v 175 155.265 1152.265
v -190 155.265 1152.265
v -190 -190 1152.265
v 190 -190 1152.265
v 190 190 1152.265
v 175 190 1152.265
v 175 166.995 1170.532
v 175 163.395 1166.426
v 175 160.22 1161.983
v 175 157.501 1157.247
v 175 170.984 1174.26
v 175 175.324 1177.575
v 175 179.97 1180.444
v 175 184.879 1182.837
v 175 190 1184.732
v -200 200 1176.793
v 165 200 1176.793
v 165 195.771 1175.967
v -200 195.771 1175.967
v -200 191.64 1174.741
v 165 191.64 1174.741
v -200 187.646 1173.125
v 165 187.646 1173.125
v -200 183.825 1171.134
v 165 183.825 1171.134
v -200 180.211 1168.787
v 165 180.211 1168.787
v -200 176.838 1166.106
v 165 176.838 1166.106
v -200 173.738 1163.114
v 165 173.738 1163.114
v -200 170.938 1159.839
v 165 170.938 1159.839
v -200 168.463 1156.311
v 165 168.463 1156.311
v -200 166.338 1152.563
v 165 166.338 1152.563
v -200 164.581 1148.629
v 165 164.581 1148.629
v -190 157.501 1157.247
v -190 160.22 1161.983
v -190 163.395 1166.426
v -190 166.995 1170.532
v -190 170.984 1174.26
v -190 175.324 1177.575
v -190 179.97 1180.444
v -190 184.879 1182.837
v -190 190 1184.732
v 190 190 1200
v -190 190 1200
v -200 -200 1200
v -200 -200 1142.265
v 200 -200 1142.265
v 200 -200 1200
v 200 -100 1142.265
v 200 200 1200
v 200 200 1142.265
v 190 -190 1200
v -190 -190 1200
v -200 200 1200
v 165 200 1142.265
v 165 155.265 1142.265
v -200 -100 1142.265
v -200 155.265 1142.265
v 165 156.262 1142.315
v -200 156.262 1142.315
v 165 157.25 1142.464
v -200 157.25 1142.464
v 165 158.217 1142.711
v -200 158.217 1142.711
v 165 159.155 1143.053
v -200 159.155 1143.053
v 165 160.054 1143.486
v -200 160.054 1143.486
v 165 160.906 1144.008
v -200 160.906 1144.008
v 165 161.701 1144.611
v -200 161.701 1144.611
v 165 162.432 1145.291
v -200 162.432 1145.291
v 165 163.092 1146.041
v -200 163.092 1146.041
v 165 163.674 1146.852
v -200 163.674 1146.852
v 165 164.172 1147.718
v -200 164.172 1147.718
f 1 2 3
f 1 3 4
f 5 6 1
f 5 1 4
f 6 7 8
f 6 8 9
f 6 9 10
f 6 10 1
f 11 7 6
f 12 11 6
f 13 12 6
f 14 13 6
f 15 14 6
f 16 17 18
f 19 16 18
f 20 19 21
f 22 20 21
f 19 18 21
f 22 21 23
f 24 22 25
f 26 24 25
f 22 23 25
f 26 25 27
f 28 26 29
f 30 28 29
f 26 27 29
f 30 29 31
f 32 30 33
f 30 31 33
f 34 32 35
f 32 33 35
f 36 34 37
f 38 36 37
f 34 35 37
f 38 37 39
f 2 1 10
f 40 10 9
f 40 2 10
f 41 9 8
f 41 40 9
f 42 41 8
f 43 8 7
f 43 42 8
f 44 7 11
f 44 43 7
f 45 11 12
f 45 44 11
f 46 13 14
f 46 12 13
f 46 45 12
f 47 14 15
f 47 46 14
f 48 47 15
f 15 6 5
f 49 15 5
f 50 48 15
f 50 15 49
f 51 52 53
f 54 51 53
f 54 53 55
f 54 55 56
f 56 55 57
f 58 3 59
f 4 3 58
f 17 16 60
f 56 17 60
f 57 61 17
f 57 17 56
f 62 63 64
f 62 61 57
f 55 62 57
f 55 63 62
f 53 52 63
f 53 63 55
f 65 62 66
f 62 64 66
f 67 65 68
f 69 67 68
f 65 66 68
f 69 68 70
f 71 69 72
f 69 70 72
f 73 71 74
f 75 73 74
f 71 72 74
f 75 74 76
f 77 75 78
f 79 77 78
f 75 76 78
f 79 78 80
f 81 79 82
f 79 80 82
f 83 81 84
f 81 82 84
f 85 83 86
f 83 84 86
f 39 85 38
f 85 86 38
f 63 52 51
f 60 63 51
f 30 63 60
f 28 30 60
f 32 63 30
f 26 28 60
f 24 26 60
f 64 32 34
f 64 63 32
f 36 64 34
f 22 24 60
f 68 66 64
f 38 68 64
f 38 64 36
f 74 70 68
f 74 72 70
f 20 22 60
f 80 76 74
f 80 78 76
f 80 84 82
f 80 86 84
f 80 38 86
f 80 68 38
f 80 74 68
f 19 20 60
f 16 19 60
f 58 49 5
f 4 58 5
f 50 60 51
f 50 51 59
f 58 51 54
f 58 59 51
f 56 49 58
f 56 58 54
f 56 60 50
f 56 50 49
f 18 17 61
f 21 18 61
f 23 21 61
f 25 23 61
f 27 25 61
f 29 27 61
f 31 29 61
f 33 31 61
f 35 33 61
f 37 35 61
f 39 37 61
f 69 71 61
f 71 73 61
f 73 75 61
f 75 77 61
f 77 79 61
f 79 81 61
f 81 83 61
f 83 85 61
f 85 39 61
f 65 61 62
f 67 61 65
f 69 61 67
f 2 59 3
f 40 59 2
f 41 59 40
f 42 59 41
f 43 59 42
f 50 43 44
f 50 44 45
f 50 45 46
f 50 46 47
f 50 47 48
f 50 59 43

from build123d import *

# Parameters (mm, degrees)
ESQUISSE1_W              = 400
ESQUISSE1_H              = 400
BOSS_EXTRU_1_DEPTH       = 1200
ESQUISSE4_W              = 400
ESQUISSE4_H              = 130.6
ENL_V_MAT_EXTRU_1_DEPTH  = 300
ENL_V_MAT_EXTRU_2_DEPTH  = 100
ESQUISSE13_W             = 400
ESQUISSE13_H             = 400
ENL_V_MAT_EXTRU_10_DEPTH = 400
ENL_V_START              = -35
ENL_V_MAT_EXTRU_11_DEPTH = 400
CONG_3_R                 = 10
ENL_V_MAT_EXTRU_12_DEPTH = 100
CONG_5_R                 = 5
COQUE1_START             = -90
COQUE1_OUTLINE_W         = 380
COQUE1_OUTLINE_H         = 591.664973081
COQUE1_DEPTH             = 280
COQUE1_START_2           = -190
COQUE1_2_DEPTH           = 345.26524617
COQUE1_3_OUTLINE_W       = 380
COQUE1_3_OUTLINE_H       = 150.6
COQUE1_3_DEPTH           = 80
COQUE1_4_DEPTH           = 380
COQUE1_START_3           = 175
COQUE1_5_DEPTH           = 15
ESQUISSE21_W             = 360
ESQUISSE21_H             = 260
ENL_V_MAT_EXTRU_13_DEPTH = 300
ENL_V_MAT_EXTRU_14_DEPTH = 674.894679675
ENL_V_MAT_EXTRU_15_DEPTH = 280
ESQUISSE24_W             = 400
ESQUISSE24_H             = 742.264973081
ENL_V_MAT_EXTRU_16_DEPTH = 1281.624847487
BOSS_EXTRU_2_REACH       = 1257.428
ESQUISSE25_W             = 380
ESQUISSE25_H             = 10


with BuildPart() as part:
    # Esquisse1 → Boss.-Extru.1 (new body)
    with BuildSketch(Plane.XY):
        Rectangle(ESQUISSE1_W, ESQUISSE1_H)
    extrude(amount=BOSS_EXTRU_1_DEPTH)

    # Esquisse4 → Enlèv. mat.-Extru.1 (cut)
    with BuildSketch(Plane(origin=(0, 200, 0), x_dir=(1, 0, 0), z_dir=(0, 1, 0))):
        with Locations((0, -1076.964973081)):
            Rectangle(ESQUISSE4_W, ESQUISSE4_H)
    extrude(amount=-ENL_V_MAT_EXTRU_1_DEPTH, mode=Mode.SUBTRACT)

    # Esquisse5 → Enlèv. mat.-Extru.2 (cut)
    with BuildSketch(Plane.XZ.offset(200)):
        with BuildLine():
            Line((-145, 902.264973081), (145, 902.264973081))
            ThreePointArc((145, 902.264973081), (155.606601718, 897.871574799), (160, 887.264973081))
            Line((160, 887.264973081), (160, 797.264973081))
            ThreePointArc((160, 797.264973081), (155.606601718, 786.658371363), (145, 782.264973081))
            Line((145, 782.264973081), (-145, 782.264973081))
            ThreePointArc((-145, 782.264973081), (-155.606601718, 786.658371363), (-160, 797.264973081))
            Line((-160, 797.264973081), (-160, 887.264973081))
            ThreePointArc((-160, 887.264973081), (-155.606601718, 897.871574799), (-145, 902.264973081))
        make_face()
    extrude(amount=-ENL_V_MAT_EXTRU_2_DEPTH, mode=Mode.SUBTRACT)

    # Esquisse13 → Enlèv. mat.-Extru.10 (cut)
    with BuildSketch(Plane(origin=(0, 0, 0), x_dir=(-1, 0, 0), z_dir=(0, 0, -1))):
        Rectangle(ESQUISSE13_W, ESQUISSE13_H)
    extrude(amount=-ENL_V_MAT_EXTRU_10_DEPTH, mode=Mode.SUBTRACT)

    # Esquisse18 → Enlèv. mat.-Extru.11 (cut)
    with BuildSketch(Plane(origin=(200, 0, 0), x_dir=(0, 0, -1), z_dir=(1, 0, 0)).offset(ENL_V_START)):
        with BuildLine():
            Line((-1142.264973081, 200), (-1176.793054109, 200))
            ThreePointArc((-1176.793054109, 200), (-1165.318675352, 175.963910431), (-1142.264973081, 162.625178063))
            Line((-1142.264973081, 162.625178063), (-1142.264973081, 200))
        make_face()
    extrude(amount=-ENL_V_MAT_EXTRU_11_DEPTH, mode=Mode.SUBTRACT)

    # Congé3
    cong_3_edges = [part.edges().sort_by_distance(p)[0] for p in [
        (-17.5, 162.625178063, 1142.264973081),
    ]]
    fillet(cong_3_edges, radius=CONG_3_R)

    # Esquisse20 → Enlèv. mat.-Extru.12 (cut)
    with BuildSketch(Plane.XZ.offset(200)):
        with BuildLine():
            Line((155, 703.393343593), (-155, 703.393343593))
            ThreePointArc((-155, 703.393343593), (-169.142135624, 697.535479217), (-175, 683.393343593))
            Line((-175, 683.393343593), (-175, 400))
            Line((-175, 400), (175, 400))
            Line((175, 400), (175, 683.393343593))
            ThreePointArc((175, 683.393343593), (169.142135624, 697.535479217), (155, 703.393343593))
        make_face()
    extrude(amount=-ENL_V_MAT_EXTRU_12_DEPTH, mode=Mode.SUBTRACT)

    # Congé5
    cong_5_edges = [part.edges().sort_by_distance(p)[0] for p in [
        (0, -100, 400),
        (175, -150, 400),
        (-175, -150, 400),
    ]]
    fillet(cong_5_edges, radius=CONG_5_R)

    # Coque1: read off the stored shape, not the designer's step
    # Coque1 outline → Coque1 (cut)
    with BuildSketch(Plane(origin=(0, 0, 0), x_dir=(1, 0, 0), z_dir=(0, 1, 0)).offset(COQUE1_START)):
        with Locations((0, -705.83248654)):
            Rectangle(COQUE1_OUTLINE_W, COQUE1_OUTLINE_H)
    extrude(amount=COQUE1_DEPTH, mode=Mode.SUBTRACT)

    # Coque1 2 outline → Coque1 2 (cut)
    # profile 1 of 2: a face of its own
    with BuildSketch(Plane(origin=(0, 0, 0), x_dir=(1, 0, 0), z_dir=(0, 1, 0)).offset(COQUE1_START_2)):
        with BuildLine():
            Line((190, -1001.664973081), (190, -410))
            Line((190, -410), (185, -410))
            Line((185, -410), (185, -683.393343593))
            ThreePointArc((185, -683.393343593), (176.213203435, -704.606547029), (155, -713.393343593))
            Line((155, -713.393343593), (-155, -713.393343593))
            ThreePointArc((-155, -713.393343593), (-176.213203435, -704.606547029), (-185, -683.393343593))
            Line((-185, -683.393343593), (-185, -410))
            Line((-185, -410), (-190, -410))
            Line((-190, -410), (-190, -1001.664973081))
            Line((-190, -1001.664973081), (190, -1001.664973081))
        make_face()
        with BuildLine():
            Line((-170, -887.264973081), (-170, -797.264973081))
            ThreePointArc((-170, -797.264973081), (-162.67766953, -779.587303551), (-145, -772.264973081))
            Line((-145, -772.264973081), (145, -772.264973081))
            ThreePointArc((145, -772.264973081), (162.67766953, -779.587303551), (170, -797.264973081))
            Line((170, -797.264973081), (170, -887.264973081))
            ThreePointArc((170, -887.264973081), (162.67766953, -904.942642611), (145, -912.264973081))
            Line((145, -912.264973081), (-145, -912.264973081))
            ThreePointArc((-145, -912.264973081), (-162.67766953, -904.942642611), (-170, -887.264973081))
        make_face(mode=Mode.SUBTRACT)
    # profile 2 of 2: a face of its own
    with BuildSketch(Plane(origin=(0, 0, 0), x_dir=(1, 0, 0), z_dir=(0, 1, 0)).offset(COQUE1_START_2)):
        Polygon((190, -1200), (190, -1152.264973081), (175, -1152.264973081), (-190, -1152.264973081), (-190, -1200), align=None)
    extrude(amount=COQUE1_2_DEPTH, mode=Mode.SUBTRACT)

    # Coque1 3 outline → Coque1 3 (cut)
    with BuildSketch(Plane(origin=(0, 0, 0), x_dir=(1, 0, 0), z_dir=(0, 1, 0)).offset(COQUE1_START_2)):
        with Locations((0, -1076.964973081)):
            Rectangle(COQUE1_3_OUTLINE_W, COQUE1_3_OUTLINE_H)
    extrude(amount=COQUE1_3_DEPTH, mode=Mode.SUBTRACT)

    # Coque1 4 outline → Coque1 4 (cut)
    with BuildSketch(Plane.YZ.offset(COQUE1_START_2)):
        with BuildLine():
            Line((190, 1184.731629159), (190, 1200))
            Line((190, 1200), (155.26524617, 1200))
            Line((155.26524617, 1200), (155.26524617, 1152.264973081))
            ThreePointArc((155.26524617, 1152.264973081), (168.943107712, 1172.445563441), (190, 1184.731629159))
        make_face()
    extrude(amount=COQUE1_4_DEPTH, mode=Mode.SUBTRACT)

    # Coque1 5 outline → Coque1 5 (cut)
    with BuildSketch(Plane.YZ.offset(COQUE1_START_3)):
        with BuildLine():
            Line((190, 1152.264973081), (190, 1184.731629159))
            ThreePointArc((190, 1184.731629159), (168.943107712, 1172.445563441), (155.26524617, 1152.264973081))
            Line((155.26524617, 1152.264973081), (190, 1152.264973081))
        make_face()
    extrude(amount=COQUE1_5_DEPTH, mode=Mode.SUBTRACT)

    # Esquisse21 → Enlèv. mat.-Extru.13 (cut)
    with BuildSketch(Plane.XY.offset(1011.664973081)):
        with Locations((0, 50)):
            Rectangle(ESQUISSE21_W, ESQUISSE21_H)
    extrude(amount=-ENL_V_MAT_EXTRU_13_DEPTH, mode=Mode.SUBTRACT)

    # Esquisse22 → Enlèv. mat.-Extru.14 (cut, through all)
    with BuildSketch(Plane.XY.offset(1011.664973081)):
        Polygon((-180, 180), (180, 180), (200, 180), (200, 200), (-200, 200), (-200, 180), align=None)
    extrude(amount=-ENL_V_MAT_EXTRU_14_DEPTH, mode=Mode.SUBTRACT)

    # Esquisse23 → Enlèv. mat.-Extru.15 (cut)
    with BuildSketch(Plane(origin=(0, 180, 0), x_dir=(1, 0, 0), z_dir=(0, 1, 0))):
        Polygon((-200, -410), (-190, -410), (190, -410), (200, -410), (200, -400), (-200, -400), align=None)
    extrude(amount=-ENL_V_MAT_EXTRU_15_DEPTH, mode=Mode.SUBTRACT)

    # Esquisse24 → Enlèv. mat.-Extru.16 (cut, through all)
    with BuildSketch(Plane.XZ.offset(200)):
        with Locations((0, 771.132486541)):
            Rectangle(ESQUISSE24_W, ESQUISSE24_H)
    extrude(amount=-ENL_V_MAT_EXTRU_16_DEPTH, mode=Mode.SUBTRACT)

    # Esquisse25 → Boss.-Extru.2 (add, up to next)
    with BuildSketch(Plane.XZ.offset(110), mode=Mode.PRIVATE) as boss_extru_2_sk1:
        with Locations((0, 1147.264973081)):
            Rectangle(ESQUISSE25_W, ESQUISSE25_H)
    boss_extru_2_tool1 = extrude(boss_extru_2_sk1.sketch, amount=BOSS_EXTRU_2_REACH, mode=Mode.PRIVATE) - part.part
    add(boss_extru_2_tool1.solids().sort_by_distance((0, -110, 1147.264973))[0])


solid = part.part
